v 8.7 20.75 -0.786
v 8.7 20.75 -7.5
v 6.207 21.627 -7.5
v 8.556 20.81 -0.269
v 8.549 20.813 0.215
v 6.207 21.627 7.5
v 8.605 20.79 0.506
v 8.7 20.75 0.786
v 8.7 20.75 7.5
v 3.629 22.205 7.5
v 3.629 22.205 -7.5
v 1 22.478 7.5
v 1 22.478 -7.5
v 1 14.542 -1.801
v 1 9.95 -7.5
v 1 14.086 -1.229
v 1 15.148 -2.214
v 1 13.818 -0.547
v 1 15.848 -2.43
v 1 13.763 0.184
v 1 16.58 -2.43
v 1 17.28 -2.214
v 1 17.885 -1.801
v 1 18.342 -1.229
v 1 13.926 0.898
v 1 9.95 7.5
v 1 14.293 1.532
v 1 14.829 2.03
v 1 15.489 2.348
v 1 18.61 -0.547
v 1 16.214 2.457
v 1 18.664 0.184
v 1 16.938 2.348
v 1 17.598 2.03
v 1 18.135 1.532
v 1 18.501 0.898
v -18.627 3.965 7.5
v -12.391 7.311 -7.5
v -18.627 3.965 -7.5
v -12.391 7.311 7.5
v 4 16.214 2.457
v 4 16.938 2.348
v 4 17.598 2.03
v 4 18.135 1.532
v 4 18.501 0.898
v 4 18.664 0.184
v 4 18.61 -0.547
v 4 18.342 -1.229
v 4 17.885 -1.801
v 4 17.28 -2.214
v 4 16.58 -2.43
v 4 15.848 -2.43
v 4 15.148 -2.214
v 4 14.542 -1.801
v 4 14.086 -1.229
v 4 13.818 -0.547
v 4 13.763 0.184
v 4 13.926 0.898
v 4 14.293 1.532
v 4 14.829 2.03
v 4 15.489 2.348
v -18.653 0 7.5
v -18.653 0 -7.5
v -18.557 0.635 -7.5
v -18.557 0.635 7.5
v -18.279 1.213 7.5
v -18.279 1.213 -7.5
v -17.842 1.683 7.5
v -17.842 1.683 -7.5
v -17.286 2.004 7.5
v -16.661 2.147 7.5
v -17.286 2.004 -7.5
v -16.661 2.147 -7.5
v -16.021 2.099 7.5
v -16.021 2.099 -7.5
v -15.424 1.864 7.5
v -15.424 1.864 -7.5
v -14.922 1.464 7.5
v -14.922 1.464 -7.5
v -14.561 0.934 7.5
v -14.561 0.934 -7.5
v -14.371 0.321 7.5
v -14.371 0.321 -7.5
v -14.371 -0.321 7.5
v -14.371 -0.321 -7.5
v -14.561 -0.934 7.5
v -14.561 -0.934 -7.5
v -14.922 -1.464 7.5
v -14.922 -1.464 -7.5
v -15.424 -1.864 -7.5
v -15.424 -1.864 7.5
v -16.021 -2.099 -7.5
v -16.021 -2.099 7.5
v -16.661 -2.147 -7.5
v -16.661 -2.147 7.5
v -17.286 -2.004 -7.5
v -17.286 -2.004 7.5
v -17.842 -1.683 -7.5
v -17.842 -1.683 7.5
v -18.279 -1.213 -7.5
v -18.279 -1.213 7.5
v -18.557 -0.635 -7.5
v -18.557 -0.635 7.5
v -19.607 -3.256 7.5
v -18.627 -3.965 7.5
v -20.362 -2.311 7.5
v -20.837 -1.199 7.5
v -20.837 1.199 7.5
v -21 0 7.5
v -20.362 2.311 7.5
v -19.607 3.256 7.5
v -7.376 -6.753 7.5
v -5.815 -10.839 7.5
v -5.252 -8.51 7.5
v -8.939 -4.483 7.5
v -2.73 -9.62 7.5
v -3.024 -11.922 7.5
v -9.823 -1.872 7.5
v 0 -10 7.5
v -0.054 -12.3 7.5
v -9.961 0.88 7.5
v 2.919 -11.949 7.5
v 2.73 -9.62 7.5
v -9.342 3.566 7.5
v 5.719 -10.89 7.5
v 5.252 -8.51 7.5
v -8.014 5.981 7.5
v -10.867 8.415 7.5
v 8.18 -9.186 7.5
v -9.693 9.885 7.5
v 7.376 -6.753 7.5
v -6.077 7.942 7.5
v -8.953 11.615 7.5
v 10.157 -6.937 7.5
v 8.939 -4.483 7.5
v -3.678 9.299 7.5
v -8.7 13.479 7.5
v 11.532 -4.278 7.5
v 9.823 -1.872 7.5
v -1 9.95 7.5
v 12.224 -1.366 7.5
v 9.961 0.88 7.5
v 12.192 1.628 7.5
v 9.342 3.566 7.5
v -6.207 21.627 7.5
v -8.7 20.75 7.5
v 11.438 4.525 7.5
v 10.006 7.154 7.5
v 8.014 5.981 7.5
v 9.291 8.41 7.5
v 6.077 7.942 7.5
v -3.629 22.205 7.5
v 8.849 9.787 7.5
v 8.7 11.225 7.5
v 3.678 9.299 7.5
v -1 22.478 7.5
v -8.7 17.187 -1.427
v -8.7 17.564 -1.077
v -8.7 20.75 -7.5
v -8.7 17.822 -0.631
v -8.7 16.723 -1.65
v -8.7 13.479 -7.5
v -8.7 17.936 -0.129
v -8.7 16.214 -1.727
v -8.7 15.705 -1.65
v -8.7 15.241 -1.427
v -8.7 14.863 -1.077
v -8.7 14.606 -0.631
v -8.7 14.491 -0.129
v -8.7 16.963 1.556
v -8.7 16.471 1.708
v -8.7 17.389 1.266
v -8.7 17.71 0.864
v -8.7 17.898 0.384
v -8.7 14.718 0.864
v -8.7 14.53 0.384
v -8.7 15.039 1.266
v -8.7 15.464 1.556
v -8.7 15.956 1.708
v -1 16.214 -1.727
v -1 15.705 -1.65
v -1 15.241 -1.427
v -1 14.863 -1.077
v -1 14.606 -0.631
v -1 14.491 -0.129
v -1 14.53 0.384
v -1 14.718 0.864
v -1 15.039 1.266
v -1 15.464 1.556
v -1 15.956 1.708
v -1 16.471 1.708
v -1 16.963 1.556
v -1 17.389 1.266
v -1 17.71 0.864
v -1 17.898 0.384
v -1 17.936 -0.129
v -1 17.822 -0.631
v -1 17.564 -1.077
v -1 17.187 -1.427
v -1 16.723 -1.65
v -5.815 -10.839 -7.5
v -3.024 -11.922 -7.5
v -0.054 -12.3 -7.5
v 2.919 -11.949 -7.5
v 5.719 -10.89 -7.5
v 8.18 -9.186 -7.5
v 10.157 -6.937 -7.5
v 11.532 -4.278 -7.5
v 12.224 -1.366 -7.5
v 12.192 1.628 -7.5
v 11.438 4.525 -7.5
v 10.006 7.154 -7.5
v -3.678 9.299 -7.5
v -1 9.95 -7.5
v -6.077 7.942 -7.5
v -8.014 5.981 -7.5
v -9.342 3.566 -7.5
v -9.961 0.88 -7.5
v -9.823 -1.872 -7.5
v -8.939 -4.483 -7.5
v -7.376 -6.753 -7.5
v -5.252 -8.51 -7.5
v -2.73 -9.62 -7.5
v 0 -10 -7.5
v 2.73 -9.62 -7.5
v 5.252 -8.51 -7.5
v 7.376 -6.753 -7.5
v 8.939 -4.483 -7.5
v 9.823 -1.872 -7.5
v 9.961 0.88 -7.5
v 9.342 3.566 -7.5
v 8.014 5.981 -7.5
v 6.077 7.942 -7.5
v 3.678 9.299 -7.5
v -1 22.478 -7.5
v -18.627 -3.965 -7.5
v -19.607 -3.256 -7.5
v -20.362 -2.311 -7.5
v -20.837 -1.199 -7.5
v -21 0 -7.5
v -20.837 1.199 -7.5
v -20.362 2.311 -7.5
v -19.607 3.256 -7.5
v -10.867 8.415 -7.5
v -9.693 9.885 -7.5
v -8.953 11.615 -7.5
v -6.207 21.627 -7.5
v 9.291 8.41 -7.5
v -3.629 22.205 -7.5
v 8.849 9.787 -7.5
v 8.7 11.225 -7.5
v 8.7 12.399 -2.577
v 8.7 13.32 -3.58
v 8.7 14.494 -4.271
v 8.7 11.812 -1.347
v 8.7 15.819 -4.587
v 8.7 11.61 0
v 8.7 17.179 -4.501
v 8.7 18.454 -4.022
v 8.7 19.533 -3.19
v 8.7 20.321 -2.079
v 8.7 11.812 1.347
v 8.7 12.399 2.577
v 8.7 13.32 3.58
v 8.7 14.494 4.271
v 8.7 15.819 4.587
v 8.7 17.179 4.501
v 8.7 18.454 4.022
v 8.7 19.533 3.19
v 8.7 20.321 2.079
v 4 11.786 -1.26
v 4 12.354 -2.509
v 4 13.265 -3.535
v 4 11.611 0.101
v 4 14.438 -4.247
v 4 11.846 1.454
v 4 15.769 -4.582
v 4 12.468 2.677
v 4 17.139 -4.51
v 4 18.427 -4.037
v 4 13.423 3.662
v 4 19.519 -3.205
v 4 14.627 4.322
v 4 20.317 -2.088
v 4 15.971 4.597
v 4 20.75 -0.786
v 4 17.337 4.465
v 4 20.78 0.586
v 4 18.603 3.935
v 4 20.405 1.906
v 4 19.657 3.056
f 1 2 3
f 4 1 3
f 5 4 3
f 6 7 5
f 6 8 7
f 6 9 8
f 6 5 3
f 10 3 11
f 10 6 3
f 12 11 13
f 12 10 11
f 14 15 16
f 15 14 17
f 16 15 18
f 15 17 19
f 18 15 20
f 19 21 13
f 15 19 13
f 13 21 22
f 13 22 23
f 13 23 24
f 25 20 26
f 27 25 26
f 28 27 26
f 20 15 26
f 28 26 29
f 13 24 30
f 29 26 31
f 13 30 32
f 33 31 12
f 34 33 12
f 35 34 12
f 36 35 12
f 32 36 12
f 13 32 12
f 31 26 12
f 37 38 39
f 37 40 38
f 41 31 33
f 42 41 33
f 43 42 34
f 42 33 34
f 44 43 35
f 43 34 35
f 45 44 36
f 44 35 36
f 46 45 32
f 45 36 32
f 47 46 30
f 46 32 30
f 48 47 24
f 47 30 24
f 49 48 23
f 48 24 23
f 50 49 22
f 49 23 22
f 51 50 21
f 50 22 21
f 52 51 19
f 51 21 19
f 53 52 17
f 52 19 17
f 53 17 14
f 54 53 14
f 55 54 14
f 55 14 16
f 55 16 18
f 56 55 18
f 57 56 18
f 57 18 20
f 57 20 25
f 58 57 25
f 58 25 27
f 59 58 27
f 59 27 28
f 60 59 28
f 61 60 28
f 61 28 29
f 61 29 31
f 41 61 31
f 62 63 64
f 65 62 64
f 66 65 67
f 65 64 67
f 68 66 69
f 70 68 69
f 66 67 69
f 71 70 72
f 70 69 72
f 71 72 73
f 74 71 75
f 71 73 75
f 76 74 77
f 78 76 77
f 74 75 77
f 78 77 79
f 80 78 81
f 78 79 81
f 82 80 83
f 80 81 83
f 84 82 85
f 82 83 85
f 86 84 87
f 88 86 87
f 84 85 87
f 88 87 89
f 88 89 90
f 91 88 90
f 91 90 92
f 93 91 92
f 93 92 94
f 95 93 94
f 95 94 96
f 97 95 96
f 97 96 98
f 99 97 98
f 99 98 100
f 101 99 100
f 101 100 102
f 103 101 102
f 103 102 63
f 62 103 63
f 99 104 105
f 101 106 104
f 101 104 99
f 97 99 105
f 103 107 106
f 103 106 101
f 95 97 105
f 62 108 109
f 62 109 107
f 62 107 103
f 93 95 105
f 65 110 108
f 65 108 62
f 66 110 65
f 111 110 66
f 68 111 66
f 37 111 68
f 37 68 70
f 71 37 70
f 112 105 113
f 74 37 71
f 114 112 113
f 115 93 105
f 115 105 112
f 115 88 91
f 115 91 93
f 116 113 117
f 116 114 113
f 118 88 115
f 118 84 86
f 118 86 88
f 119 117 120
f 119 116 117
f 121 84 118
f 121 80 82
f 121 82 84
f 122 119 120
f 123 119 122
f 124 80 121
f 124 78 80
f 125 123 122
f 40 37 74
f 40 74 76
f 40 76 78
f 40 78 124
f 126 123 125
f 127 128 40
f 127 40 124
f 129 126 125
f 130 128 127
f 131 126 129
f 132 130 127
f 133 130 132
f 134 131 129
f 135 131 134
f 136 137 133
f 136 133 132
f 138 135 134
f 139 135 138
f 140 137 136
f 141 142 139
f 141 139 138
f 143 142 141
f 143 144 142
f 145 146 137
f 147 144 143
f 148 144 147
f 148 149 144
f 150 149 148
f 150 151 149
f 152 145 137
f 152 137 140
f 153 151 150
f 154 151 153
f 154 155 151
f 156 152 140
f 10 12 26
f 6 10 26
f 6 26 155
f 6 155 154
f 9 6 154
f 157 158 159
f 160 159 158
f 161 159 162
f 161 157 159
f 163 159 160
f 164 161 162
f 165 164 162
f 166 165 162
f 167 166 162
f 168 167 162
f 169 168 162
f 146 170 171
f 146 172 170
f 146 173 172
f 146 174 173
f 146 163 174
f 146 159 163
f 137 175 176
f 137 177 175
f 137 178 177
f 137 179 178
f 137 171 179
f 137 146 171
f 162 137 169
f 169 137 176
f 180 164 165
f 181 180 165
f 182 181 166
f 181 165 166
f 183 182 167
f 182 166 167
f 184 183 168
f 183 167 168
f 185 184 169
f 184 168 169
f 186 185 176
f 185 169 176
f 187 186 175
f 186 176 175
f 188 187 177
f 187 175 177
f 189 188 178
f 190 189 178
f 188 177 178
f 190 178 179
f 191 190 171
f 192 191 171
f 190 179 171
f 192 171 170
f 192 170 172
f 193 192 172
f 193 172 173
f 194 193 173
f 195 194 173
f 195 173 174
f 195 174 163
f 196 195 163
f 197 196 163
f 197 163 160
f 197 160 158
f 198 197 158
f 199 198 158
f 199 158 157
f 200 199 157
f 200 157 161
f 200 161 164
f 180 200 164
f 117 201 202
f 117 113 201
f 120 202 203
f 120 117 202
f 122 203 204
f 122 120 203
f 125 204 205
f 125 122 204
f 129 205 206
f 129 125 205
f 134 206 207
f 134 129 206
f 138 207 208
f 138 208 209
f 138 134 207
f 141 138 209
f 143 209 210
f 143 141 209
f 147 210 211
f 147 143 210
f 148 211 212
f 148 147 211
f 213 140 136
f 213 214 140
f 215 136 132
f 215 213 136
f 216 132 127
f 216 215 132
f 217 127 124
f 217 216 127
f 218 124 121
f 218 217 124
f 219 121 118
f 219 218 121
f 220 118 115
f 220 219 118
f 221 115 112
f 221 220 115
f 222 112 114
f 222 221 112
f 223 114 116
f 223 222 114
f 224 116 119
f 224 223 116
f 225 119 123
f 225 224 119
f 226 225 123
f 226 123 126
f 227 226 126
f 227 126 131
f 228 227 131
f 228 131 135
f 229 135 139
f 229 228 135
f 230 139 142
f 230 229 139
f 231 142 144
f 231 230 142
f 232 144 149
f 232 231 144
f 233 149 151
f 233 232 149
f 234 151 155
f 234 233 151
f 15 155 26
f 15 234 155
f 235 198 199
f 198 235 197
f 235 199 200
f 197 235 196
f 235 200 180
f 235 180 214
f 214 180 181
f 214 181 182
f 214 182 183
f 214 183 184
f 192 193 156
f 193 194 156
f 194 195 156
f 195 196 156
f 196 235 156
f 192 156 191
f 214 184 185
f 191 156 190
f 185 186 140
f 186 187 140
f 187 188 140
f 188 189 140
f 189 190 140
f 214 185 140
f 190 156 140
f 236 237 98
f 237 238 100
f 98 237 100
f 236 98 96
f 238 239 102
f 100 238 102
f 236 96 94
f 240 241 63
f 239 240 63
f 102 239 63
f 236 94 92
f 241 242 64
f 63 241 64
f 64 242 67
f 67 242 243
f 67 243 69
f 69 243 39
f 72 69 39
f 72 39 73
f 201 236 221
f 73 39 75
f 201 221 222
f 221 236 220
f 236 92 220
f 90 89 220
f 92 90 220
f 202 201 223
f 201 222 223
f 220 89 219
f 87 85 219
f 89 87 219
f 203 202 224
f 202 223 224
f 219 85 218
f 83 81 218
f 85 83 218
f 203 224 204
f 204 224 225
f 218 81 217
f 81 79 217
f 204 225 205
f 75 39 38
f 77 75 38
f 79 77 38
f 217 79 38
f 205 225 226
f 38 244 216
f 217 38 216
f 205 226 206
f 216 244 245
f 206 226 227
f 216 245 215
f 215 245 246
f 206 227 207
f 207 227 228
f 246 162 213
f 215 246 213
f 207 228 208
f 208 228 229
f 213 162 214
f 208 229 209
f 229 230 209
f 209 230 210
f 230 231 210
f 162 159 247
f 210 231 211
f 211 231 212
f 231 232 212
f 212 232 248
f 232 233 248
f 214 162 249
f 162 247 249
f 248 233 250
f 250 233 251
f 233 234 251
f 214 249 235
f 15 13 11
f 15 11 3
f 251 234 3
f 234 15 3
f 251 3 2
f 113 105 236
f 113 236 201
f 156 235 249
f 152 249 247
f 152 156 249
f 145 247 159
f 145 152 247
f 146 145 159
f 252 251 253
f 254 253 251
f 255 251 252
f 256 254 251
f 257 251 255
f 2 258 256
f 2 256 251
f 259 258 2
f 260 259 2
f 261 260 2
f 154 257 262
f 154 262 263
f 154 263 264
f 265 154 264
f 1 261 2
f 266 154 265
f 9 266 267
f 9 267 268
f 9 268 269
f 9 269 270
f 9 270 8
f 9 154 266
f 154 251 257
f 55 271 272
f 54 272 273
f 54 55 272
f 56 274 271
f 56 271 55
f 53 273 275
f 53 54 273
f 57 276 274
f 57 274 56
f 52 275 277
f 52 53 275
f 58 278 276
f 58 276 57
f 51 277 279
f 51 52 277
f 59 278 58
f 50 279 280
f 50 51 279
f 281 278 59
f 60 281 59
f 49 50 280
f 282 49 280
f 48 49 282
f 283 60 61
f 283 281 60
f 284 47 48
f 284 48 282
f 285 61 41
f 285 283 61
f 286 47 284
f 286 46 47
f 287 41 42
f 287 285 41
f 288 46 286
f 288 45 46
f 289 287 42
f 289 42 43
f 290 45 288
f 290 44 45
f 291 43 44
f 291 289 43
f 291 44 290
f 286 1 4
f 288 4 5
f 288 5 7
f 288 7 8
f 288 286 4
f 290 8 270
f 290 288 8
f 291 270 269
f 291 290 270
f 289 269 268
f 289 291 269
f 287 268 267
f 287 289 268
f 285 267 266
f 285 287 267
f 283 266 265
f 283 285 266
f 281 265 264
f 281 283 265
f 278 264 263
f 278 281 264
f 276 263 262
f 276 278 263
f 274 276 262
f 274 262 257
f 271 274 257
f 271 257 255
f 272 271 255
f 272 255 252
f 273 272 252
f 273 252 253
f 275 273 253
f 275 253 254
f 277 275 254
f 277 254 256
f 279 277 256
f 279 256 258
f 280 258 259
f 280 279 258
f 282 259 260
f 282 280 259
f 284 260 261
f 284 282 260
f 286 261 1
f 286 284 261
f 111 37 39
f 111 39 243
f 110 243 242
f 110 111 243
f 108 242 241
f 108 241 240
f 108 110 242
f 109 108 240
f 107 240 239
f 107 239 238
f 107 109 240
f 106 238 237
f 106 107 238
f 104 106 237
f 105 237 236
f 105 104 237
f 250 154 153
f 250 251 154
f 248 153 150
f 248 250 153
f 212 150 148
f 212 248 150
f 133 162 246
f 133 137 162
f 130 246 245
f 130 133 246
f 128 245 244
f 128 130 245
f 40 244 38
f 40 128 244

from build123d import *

# Parameters (mm, degrees)
SKETCH1_R                 = 10
BOSS_EXTRUDE1_DEPTH       = 7.5
FILLET1_R                 = 7
CUT_EXTRUDE1_DEPTH        = 16
CUT_EXTRUDE2_START        = 3
SKETCH3_R                 = 4.60375
CUT_EXTRUDE2_DEPTH        = 15
F_8_CLEARANCE_HOLE1_D     = 4.9149
F_8_CLEARANCE_HOLE1_DEPTH = 3
F_8_32_TAPPED_HOLE1_D     = 3.4544
F_8_CLEARANCE_HOLE2_D     = 4.3053
F_8_CLEARANCE_HOLE2_DEPTH = 15


with BuildPart() as part:
    # Sketch1 → Boss-Extrude1 (new body, symmetric)
    with BuildSketch(Plane.XY):
        with BuildLine():
            Line((-8.7, 20.749939759), (-8.7, 9.290956753))
            Line((-8.7, 9.290956753), (-18.627272727, 3.96543954))
            ThreePointArc((-18.627272727, 3.96543954), (-21, 0), (-18.627272727, -3.96543954))
            Line((-18.627272727, -3.96543954), (-5.814545455, -10.838868075))
            ThreePointArc((-5.814545455, -10.838868075), (9.872829559, -7.336023207), (8.7, 8.694826048))
            Line((8.7, 8.694826048), (8.7, 20.749939759))
            ThreePointArc((8.7, 20.749939759), (0, 22.5), (-8.7, 20.749939759))
        make_face()
        Circle(SKETCH1_R, mode=Mode.SUBTRACT)
    extrude(amount=BOSS_EXTRUDE1_DEPTH, both=True)

    # Fillet1
    fillet1_edges = [part.edges().sort_by_distance(p)[0] for p in [
        (8.7, 8.694826048, 0),
        (-8.7, 9.290956753, 0),
    ]]
    fillet(fillet1_edges, radius=FILLET1_R)

    # Sketch2 → Cut-Extrude1 (cut, through all)
    with BuildSketch(Plane.XY.offset(7.5)):
        with BuildLine():
            Line((-1, 22.477766793), (-1, 9.949874371))
            ThreePointArc((-1, 9.949874371), (0, 10), (1, 9.949874371))
            Line((1, 9.949874371), (1, 22.477766793))
            ThreePointArc((1, 22.477766793), (0, 22.5), (-1, 22.477766793))
        make_face()
    extrude(amount=-CUT_EXTRUDE1_DEPTH, mode=Mode.SUBTRACT)

    # Sketch3 → Cut-Extrude2 (cut)
    with BuildSketch(Plane(origin=(1, 0, 0), x_dir=(0, 0, -1), z_dir=(1, 0, 0)).offset(CUT_EXTRUDE2_START)):
        with Locations(Location((0, 16.213820582, 0), (0, 0, 80.166973696))):  # turned: the seam where the file's is
            Circle(SKETCH3_R)
    extrude(amount=CUT_EXTRUDE2_DEPTH, mode=Mode.SUBTRACT)

    # #8 Clearance Hole1
    with Locations(Plane(origin=(4, 0, 0), x_dir=(0, 0, -1), z_dir=(1, 0, 0))):
        with Locations((0, 16.213820582)):
            Hole(F_8_CLEARANCE_HOLE1_D / 2, depth=F_8_CLEARANCE_HOLE1_DEPTH)

    # #8-32 Tapped Hole1 (through all)
    with Locations(Plane(origin=(-1, 1.097851263, -6.242435486), x_dir=(0, 0, 1), z_dir=(1, 0, 0))):
        with Locations((6.242435486, -15.115969319)):
            Hole(F_8_32_TAPPED_HOLE1_D / 2)

    # #8 Clearance Hole2
    with Locations(Plane.XY.offset(7.5)):
        with Locations((-16.5, 0)):
            Hole(F_8_CLEARANCE_HOLE2_D / 2, depth=F_8_CLEARANCE_HOLE2_DEPTH)


solid = part.part
